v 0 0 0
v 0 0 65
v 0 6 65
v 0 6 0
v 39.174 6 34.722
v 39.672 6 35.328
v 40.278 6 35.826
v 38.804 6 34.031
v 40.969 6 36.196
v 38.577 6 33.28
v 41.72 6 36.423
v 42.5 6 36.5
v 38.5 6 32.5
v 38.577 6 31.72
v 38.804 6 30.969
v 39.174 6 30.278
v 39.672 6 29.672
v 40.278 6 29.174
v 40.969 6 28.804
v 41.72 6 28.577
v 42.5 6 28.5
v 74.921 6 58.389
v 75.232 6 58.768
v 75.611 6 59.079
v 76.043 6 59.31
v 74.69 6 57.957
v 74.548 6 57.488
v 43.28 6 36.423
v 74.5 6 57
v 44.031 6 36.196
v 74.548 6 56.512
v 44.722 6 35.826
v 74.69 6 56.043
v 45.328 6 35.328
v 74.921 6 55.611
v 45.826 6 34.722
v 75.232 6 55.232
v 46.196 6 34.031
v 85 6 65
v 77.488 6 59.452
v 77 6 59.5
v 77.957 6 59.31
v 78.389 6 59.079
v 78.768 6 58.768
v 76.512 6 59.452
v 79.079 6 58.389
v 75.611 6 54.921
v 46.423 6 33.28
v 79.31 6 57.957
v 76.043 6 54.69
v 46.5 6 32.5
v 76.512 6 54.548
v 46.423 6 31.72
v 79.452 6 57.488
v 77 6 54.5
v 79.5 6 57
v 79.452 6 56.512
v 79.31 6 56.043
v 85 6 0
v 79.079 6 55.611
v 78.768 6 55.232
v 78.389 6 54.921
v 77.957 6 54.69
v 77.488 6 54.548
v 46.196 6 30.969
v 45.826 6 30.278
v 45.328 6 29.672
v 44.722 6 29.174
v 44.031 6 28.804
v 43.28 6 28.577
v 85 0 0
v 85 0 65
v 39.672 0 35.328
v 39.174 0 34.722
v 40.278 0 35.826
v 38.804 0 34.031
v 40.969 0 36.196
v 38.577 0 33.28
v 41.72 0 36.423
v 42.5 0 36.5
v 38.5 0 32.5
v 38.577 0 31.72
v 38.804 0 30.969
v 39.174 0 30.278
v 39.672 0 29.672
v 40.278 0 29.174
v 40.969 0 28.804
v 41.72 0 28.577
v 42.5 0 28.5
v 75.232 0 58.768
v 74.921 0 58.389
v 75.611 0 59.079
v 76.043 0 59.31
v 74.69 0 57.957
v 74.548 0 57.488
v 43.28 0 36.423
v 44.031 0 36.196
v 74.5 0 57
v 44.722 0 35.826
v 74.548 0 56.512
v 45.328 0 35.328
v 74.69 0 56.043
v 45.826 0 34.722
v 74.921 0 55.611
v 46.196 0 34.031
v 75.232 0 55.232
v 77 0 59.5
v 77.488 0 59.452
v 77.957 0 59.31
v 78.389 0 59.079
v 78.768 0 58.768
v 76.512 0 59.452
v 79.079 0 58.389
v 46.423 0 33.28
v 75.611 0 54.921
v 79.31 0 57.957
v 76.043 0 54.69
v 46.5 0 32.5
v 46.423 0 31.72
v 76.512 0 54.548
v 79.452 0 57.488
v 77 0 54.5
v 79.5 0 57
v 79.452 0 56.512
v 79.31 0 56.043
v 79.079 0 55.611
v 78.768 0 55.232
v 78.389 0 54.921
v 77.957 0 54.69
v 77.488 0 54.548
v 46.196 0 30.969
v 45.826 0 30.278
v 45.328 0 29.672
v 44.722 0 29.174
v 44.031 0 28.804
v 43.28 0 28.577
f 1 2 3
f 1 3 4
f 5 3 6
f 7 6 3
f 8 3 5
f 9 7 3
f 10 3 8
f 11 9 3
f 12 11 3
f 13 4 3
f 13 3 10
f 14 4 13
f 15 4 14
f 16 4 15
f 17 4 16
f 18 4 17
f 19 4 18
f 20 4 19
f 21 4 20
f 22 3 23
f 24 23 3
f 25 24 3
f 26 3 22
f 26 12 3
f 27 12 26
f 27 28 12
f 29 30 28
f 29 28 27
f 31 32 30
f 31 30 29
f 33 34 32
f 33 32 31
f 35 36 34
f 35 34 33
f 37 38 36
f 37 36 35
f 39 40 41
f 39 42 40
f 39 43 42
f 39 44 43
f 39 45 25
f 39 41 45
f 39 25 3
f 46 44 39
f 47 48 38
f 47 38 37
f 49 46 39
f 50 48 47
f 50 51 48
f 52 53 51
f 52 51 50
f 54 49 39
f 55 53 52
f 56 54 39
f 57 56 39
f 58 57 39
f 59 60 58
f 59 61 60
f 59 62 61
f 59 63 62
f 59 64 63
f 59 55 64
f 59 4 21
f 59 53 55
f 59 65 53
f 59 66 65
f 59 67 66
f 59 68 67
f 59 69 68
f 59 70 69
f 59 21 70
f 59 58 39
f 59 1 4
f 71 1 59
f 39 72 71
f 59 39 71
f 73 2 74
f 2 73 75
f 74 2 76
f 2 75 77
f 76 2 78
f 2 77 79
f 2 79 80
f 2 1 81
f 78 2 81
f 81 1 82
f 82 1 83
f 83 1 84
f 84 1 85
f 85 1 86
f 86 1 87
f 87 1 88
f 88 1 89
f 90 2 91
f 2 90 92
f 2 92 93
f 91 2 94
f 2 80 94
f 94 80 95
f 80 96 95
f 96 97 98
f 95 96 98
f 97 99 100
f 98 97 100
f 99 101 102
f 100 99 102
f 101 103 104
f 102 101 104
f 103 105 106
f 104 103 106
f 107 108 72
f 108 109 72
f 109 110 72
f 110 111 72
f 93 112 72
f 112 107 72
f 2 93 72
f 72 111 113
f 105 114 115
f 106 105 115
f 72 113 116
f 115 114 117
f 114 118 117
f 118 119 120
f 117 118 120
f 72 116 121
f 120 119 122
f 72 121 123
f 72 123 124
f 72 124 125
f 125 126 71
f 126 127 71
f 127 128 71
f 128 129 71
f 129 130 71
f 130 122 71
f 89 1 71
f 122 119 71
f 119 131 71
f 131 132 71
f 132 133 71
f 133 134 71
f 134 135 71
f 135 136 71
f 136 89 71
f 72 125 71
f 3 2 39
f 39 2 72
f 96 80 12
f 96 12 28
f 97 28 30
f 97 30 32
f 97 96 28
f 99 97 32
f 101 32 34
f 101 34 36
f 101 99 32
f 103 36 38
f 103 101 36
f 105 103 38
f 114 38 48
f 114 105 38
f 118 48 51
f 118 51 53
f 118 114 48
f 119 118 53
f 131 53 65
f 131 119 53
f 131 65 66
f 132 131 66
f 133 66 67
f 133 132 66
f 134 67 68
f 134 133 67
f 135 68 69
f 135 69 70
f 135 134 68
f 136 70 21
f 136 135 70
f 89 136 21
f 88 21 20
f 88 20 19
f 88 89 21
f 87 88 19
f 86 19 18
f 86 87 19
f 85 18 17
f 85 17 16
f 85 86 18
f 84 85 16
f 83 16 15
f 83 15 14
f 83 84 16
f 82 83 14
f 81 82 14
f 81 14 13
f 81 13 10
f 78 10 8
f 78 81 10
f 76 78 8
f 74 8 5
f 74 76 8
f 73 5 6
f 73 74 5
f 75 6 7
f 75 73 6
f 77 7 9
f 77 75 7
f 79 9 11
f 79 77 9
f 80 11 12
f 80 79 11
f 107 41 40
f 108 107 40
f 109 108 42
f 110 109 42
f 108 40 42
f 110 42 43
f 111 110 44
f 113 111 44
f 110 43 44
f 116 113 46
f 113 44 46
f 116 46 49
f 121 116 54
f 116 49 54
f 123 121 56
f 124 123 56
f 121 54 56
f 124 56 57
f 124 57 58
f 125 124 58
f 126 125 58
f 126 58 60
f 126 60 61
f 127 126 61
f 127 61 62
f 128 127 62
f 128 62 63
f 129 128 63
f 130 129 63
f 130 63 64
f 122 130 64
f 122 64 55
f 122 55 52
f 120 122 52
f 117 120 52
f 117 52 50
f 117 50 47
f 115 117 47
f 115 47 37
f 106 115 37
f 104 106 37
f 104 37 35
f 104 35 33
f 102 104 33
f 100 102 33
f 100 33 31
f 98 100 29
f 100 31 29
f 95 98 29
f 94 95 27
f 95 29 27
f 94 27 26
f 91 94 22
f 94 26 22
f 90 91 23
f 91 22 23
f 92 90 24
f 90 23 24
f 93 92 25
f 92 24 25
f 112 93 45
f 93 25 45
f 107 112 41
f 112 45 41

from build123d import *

# Parameters (mm, degrees)
SKETCH_1_W          = 85
SKETCH_1_H          = 65
SKETCH_1_R          = 4
EXTRUDE_1_DEPTH     = 6
SKETCH_2_R          = 2.5
CUT_EXTRUDE_1_DEPTH = 108.172757733


with BuildPart() as part:
    # Эскиз1 → Вытянуть1 (new body)
    with BuildSketch(Plane(origin=(0, 0, 0), x_dir=(1, 0, 0), z_dir=(0, 1, 0))):
        with Locations((42.5, -32.5)):
            Rectangle(SKETCH_1_W, SKETCH_1_H)
        with Locations(Location((42.5, -32.5, 0), (0, 0, 270))):
            Circle(SKETCH_1_R, mode=Mode.SUBTRACT)
    extrude(amount=EXTRUDE_1_DEPTH)

    # Эскиз2 → Вырез-Вытянуть1 (cut, through all)
    with BuildSketch(Plane(origin=(0, 6, 0), x_dir=(1, 0, 0), z_dir=(0, 1, 0))):
        with Locations(Location((77, -57, 0), (0, 0, 270))):
            Circle(SKETCH_2_R)
    extrude(amount=-CUT_EXTRUDE_1_DEPTH, mode=Mode.SUBTRACT)


solid = part.part
